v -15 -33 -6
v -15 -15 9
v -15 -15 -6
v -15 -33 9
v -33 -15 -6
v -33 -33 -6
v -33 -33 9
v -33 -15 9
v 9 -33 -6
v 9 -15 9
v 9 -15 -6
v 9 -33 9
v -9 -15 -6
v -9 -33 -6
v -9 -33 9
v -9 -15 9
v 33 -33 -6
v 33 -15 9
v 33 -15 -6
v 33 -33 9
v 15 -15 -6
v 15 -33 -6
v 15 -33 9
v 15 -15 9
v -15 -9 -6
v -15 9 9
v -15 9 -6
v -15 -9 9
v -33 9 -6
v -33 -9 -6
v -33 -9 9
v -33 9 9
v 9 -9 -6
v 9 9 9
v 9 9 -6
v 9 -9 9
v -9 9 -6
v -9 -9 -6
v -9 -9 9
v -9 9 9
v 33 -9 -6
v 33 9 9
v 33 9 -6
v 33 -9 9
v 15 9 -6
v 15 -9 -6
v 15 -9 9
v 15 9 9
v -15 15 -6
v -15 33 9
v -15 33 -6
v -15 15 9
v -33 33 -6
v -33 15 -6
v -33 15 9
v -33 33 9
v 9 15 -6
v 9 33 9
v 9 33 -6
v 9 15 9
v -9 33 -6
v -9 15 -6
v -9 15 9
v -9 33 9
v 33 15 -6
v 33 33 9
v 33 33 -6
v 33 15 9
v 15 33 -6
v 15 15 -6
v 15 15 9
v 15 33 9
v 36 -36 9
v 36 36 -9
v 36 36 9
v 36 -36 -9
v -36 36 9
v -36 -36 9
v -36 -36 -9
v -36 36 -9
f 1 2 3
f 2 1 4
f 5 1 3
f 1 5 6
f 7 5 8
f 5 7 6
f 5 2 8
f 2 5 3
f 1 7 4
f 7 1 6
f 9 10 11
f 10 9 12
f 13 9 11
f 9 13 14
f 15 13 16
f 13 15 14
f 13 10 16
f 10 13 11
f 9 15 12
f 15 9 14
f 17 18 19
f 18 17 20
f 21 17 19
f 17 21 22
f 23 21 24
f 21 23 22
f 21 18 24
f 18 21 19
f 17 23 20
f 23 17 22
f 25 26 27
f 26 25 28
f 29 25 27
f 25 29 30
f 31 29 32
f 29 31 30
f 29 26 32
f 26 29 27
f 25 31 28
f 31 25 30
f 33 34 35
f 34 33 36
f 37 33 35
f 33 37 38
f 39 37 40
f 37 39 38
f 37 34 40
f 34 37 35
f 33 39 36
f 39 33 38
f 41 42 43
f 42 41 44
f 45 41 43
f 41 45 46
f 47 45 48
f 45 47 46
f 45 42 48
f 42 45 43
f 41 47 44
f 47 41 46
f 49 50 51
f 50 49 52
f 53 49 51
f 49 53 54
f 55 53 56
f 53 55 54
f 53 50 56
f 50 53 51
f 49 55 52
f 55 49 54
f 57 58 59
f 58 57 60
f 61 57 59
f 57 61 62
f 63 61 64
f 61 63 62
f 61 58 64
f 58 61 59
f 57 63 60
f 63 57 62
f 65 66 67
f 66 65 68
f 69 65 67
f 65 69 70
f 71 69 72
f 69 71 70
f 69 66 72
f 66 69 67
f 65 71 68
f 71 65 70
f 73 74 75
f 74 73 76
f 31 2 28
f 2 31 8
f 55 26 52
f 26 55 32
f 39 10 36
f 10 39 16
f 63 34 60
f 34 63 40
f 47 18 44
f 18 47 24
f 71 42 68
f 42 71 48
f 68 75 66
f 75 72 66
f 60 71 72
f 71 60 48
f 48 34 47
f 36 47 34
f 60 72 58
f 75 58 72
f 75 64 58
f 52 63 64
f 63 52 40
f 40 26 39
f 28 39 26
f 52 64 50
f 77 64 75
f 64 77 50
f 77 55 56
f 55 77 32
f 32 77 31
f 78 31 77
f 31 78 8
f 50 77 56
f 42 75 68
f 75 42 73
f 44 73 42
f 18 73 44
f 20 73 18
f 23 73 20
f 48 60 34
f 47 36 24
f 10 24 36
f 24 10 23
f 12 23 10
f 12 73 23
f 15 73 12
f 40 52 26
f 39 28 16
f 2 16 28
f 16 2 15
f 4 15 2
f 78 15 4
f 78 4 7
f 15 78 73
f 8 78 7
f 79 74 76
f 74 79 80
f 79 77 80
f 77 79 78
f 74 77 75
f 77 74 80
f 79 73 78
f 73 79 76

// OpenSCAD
$fn = 32;

// ----------------------------------------------------------------------
// Pocket plate 72 x 72 x 18
// 3 x 3 pockets 18 mm square, 15 mm deep
// ----------------------------------------------------------------------

// --- parameters (mm) ---
thickness = 18;  // plate thickness
floor_t = 3;     // material left under each pocket
pocket = 18;     // pocket side length
pitch_x = 24;    // pocket pitch along X
pitch_y = 24;    // pocket pitch along Y
cols = 3;        // pockets per row
rows = 3;        // rows of pockets

// --- derived feature positions (mm) ---
depth = thickness - floor_t;        // = 15   pocket depth, down to the floor
span_x = (cols - 1) * pitch_x;      // = 48   distance between outer pockets
span_y = (rows - 1) * pitch_y;      // = 48   distance between outer pocket rows
origin_x = -span_x / 2;             // = -24   X of the first pocket
origin_y = -span_y / 2;             // = -24   Y of the first pocket
plate = [span_x + pocket + 6, span_y + pocket + 6, thickness];  // = [72, 72, 18]   overall size: pockets plus 3 mm of wall on each side
feature_centers = [
  [origin_x + 0 * pitch_x, origin_y + 0 * pitch_y],
  [origin_x + 1 * pitch_x, origin_y + 0 * pitch_y],
  [origin_x + 2 * pitch_x, origin_y + 0 * pitch_y],
  [origin_x + 0 * pitch_x, origin_y + 1 * pitch_y],
  [origin_x + 1 * pitch_x, origin_y + 1 * pitch_y],
  [origin_x + 2 * pitch_x, origin_y + 1 * pitch_y],
  [origin_x + 0 * pitch_x, origin_y + 2 * pitch_y],
  [origin_x + 1 * pitch_x, origin_y + 2 * pitch_y],
  [origin_x + 2 * pitch_x, origin_y + 2 * pitch_y]
];   // pocket centres, used verbatim by the cutter loop

// plate outline, then one pocket per centre in feature_centers
difference() {
  cube(plate, center = true);
  for (centre = feature_centers)
    translate([centre[0] - pocket / 2, centre[1] - pocket / 2, plate[2] / 2 - depth])
      cube([pocket, pocket, depth + 1]);  // centred on the declared pocket centre
}
